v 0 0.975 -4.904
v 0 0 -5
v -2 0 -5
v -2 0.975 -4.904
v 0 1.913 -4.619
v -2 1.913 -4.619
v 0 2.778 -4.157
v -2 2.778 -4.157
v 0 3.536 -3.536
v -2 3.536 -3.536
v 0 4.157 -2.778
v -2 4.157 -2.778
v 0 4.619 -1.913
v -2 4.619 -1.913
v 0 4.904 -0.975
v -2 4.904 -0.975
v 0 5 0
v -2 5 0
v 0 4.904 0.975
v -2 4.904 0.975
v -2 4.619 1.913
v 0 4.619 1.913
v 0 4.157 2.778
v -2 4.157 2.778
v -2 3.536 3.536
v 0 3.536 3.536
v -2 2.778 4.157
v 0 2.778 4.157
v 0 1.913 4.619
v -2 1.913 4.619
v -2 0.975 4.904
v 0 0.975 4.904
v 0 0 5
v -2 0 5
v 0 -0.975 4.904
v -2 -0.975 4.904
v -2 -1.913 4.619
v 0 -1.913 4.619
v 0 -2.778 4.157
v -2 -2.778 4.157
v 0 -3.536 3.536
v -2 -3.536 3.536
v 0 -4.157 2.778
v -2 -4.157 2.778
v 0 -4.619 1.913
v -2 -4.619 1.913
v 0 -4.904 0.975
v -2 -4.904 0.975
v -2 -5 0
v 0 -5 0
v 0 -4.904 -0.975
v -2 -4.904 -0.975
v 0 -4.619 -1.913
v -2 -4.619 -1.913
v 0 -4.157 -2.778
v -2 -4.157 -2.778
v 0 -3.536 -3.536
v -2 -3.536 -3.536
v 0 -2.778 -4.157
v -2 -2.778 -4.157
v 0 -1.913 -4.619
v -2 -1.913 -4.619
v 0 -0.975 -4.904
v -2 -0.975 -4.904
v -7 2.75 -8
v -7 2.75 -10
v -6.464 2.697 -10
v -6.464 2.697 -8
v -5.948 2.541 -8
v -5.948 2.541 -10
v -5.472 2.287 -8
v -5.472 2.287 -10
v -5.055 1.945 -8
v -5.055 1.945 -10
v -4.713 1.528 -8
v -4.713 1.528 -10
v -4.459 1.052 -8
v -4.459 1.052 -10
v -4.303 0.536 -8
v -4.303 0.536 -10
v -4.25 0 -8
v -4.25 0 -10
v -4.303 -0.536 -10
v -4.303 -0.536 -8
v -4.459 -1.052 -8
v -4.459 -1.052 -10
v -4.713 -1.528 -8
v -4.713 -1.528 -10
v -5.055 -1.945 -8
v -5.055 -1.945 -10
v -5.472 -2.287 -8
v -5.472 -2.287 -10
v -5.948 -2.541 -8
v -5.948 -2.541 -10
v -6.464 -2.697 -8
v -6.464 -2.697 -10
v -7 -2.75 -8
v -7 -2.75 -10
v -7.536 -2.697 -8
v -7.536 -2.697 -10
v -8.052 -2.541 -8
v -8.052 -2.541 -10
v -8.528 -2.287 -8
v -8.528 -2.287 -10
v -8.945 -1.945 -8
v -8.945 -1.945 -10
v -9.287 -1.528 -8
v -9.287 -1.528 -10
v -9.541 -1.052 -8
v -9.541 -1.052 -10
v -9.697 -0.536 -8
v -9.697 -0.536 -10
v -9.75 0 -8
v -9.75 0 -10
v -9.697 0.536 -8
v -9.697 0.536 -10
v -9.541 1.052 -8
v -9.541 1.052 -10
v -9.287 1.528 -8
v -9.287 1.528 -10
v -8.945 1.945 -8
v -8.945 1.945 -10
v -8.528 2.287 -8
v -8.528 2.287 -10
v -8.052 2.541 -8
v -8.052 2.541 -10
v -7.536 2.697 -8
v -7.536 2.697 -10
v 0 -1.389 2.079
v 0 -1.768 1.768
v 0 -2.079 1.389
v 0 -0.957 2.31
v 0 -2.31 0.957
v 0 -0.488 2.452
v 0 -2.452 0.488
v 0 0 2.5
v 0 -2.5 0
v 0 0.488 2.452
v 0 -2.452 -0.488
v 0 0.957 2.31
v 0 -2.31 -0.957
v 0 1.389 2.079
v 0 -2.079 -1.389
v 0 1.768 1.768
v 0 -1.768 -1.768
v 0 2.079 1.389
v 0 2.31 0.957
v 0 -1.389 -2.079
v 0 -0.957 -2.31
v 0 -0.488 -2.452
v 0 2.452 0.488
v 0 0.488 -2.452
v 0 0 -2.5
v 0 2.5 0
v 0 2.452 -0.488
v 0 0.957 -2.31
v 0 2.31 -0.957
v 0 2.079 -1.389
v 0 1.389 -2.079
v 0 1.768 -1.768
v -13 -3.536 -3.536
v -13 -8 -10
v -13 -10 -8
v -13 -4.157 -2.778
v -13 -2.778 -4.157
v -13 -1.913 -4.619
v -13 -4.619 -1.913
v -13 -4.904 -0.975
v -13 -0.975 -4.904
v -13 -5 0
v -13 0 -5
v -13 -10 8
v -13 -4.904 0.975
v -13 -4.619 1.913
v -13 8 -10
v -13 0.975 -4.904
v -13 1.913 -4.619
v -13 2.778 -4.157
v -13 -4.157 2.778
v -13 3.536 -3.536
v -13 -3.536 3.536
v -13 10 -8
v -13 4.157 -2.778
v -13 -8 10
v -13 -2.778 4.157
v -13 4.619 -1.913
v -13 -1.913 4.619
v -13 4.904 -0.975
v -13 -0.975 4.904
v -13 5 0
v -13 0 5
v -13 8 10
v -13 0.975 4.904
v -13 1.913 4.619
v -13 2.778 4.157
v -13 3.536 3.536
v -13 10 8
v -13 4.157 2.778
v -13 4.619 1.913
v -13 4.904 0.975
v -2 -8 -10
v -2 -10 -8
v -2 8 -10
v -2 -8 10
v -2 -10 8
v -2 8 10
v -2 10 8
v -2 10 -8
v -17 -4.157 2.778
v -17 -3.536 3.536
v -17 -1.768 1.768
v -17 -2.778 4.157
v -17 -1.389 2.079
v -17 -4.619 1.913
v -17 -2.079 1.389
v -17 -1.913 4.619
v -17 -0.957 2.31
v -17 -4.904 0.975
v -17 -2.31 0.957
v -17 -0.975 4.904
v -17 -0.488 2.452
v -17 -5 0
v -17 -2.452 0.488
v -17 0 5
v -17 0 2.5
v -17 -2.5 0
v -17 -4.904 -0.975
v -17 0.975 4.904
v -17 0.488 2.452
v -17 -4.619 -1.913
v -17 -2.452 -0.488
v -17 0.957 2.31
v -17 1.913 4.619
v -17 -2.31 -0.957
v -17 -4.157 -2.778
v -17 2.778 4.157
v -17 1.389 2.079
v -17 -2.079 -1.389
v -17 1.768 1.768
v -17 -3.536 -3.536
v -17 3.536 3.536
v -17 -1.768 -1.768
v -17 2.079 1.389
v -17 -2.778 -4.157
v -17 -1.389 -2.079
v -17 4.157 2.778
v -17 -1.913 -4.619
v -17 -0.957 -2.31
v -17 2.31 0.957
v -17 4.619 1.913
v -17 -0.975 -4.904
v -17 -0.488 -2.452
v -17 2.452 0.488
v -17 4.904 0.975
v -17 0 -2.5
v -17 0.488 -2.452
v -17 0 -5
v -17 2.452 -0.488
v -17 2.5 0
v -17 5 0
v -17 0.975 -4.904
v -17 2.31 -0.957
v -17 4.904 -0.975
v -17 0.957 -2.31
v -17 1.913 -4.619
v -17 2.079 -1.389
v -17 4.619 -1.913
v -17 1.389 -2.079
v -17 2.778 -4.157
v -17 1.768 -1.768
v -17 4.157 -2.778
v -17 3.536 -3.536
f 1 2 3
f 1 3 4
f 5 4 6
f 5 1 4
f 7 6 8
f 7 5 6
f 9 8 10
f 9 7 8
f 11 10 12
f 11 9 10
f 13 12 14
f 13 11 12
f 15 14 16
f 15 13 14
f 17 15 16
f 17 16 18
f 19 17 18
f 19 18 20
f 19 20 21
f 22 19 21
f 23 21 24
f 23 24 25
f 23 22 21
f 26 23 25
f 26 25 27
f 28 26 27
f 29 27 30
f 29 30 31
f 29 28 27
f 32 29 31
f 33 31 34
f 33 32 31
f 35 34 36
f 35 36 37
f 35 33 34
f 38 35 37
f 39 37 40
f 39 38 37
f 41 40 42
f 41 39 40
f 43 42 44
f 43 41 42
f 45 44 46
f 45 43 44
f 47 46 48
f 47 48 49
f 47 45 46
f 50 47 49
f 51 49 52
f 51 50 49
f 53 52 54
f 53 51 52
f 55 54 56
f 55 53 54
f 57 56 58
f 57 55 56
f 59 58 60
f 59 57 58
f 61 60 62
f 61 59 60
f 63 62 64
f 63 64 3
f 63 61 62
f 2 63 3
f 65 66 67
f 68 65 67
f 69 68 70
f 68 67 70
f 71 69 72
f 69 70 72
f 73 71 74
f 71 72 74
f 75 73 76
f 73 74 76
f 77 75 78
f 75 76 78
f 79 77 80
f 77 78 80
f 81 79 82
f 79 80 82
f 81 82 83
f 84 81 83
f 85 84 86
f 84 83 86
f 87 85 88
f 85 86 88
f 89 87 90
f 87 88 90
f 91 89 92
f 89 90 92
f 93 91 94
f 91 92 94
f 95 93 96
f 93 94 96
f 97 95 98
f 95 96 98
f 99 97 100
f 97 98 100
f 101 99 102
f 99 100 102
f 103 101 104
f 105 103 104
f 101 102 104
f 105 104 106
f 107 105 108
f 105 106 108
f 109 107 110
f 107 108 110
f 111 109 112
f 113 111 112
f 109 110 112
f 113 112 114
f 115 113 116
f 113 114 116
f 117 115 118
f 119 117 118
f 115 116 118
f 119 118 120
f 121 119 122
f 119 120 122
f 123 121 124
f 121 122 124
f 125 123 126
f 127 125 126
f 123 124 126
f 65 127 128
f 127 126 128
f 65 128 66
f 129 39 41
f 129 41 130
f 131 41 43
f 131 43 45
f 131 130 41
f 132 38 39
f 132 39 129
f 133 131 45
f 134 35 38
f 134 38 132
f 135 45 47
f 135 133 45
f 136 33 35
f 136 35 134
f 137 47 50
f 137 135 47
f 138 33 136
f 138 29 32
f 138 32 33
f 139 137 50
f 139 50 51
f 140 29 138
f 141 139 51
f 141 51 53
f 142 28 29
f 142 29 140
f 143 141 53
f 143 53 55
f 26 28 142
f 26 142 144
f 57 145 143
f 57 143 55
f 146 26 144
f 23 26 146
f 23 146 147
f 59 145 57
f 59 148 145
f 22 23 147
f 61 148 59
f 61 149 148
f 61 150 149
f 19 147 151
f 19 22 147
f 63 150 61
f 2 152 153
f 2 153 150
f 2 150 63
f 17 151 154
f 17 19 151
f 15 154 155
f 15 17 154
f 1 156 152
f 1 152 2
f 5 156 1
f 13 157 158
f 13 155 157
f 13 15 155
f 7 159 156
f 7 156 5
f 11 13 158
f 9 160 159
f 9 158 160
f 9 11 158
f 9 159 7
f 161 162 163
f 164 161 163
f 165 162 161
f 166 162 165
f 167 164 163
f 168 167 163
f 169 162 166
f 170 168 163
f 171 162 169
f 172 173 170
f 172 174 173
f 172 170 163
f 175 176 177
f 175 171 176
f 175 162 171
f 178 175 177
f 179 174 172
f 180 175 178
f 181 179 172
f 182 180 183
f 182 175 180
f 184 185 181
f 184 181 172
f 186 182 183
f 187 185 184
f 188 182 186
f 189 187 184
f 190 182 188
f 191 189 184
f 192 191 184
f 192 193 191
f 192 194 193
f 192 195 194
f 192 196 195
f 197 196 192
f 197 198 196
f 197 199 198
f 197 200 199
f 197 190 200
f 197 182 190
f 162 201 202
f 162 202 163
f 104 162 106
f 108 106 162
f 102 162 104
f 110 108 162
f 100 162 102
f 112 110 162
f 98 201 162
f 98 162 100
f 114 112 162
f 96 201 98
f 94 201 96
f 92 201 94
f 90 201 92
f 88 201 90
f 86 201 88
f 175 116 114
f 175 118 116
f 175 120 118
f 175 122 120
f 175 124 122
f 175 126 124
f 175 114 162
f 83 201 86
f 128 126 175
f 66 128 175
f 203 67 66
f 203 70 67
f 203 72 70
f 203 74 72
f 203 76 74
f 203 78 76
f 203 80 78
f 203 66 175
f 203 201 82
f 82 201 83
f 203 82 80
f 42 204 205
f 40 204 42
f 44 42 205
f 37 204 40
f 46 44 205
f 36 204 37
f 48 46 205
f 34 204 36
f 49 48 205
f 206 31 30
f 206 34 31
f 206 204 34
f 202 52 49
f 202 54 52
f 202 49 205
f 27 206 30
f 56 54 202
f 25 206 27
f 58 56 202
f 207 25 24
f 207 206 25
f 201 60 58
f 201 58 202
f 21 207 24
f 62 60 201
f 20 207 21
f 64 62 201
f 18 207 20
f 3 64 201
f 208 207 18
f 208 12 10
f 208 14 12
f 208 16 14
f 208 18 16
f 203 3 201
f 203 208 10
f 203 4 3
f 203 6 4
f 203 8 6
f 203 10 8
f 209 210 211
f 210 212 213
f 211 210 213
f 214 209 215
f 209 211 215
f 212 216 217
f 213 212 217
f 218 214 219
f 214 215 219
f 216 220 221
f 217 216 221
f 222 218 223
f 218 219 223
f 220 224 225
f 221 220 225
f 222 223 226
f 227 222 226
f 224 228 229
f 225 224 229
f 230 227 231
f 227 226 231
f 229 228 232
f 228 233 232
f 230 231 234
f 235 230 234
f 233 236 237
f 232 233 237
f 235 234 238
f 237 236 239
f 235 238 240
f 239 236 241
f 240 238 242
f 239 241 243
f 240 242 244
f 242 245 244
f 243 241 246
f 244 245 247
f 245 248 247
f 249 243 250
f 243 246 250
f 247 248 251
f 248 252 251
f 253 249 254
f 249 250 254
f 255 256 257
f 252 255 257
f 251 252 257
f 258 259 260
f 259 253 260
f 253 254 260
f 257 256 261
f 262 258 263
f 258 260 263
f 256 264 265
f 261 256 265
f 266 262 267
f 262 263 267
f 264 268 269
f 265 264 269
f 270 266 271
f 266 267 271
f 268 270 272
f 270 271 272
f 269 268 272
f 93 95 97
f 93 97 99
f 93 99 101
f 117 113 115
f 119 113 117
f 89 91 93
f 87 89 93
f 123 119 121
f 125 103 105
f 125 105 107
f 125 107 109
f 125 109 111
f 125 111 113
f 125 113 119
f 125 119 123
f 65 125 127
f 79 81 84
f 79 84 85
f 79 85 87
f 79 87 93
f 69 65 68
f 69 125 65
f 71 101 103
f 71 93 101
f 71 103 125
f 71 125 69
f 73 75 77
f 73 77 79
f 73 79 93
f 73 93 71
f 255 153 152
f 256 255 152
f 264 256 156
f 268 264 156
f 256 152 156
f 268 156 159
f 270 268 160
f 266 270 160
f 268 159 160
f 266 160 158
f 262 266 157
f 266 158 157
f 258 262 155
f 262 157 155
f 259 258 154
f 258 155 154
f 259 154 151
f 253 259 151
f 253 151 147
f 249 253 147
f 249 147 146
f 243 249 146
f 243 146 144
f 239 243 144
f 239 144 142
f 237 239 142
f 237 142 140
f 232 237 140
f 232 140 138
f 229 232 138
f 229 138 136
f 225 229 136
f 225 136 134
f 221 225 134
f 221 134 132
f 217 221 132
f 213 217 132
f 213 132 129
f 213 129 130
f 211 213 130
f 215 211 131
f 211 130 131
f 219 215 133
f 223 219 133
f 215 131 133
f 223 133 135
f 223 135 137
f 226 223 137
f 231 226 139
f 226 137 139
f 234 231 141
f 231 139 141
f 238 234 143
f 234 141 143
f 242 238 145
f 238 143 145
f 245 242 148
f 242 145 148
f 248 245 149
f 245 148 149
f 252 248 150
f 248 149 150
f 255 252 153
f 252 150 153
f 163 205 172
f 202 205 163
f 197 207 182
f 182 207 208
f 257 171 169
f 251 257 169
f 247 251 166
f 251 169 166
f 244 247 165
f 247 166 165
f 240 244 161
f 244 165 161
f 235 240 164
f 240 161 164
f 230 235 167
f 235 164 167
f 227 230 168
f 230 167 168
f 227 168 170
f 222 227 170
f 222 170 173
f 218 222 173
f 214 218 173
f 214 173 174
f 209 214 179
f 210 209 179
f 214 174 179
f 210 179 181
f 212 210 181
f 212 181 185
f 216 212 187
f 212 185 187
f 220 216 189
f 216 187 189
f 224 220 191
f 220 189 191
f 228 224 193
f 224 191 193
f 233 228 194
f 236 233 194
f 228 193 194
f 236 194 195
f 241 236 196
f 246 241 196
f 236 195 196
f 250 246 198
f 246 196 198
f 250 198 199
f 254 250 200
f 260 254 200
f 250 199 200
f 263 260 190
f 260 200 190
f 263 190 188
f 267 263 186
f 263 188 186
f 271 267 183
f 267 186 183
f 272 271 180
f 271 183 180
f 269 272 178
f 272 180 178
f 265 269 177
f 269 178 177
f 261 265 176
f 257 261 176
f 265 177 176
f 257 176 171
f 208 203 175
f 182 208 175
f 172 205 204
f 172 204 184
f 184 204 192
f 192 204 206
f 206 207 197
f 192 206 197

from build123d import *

# Parameters (mm, degrees)
SKETCH1_W           = 20
SKETCH1_H           = 20
BOSS_EXTRUDE1_DEPTH = 17
SKETCH2_R           = 15.353568197
SKETCH2_R_2         = 5
CUT_EXTRUDE1_DEPTH  = 2
CUT_EXTRUDE2_START  = -4
SKETCH3_R           = 15.635411304
SKETCH3_R_2         = 5
CUT_EXTRUDE2_DEPTH  = 4
SKETCH4_R           = 2.5
CUT_EXTRUDE3_DEPTH  = 23.113344387
CHAMFER1_SIZE       = 2
SKETCH5_R           = 2.75
CUT_EXTRUDE4_DEPTH  = 2


with BuildPart() as part:
    # Sketch1 → Boss-Extrude1 (new body)
    with BuildSketch(Plane(origin=(0, 0, 0), x_dir=(0, 0, -1), z_dir=(1, 0, 0))):
        Rectangle(SKETCH1_W, SKETCH1_H)
    extrude(amount=-BOSS_EXTRUDE1_DEPTH)

    # Sketch2 → Cut-Extrude1 (cut)
    with BuildSketch(Plane(origin=(0, 0, 0), x_dir=(0, 0, -1), z_dir=(1, 0, 0))):
        Circle(SKETCH2_R)
        Circle(SKETCH2_R_2, mode=Mode.SUBTRACT)
    extrude(amount=-CUT_EXTRUDE1_DEPTH, mode=Mode.SUBTRACT)

    # Sketch3 → Cut-Extrude2 (cut)
    with BuildSketch(Plane.ZY.offset(17).offset(CUT_EXTRUDE2_START)):
        Circle(SKETCH3_R)
        with Locations(Location((0, 0, 0), (0, 0, 180))):
            Circle(SKETCH3_R_2, mode=Mode.SUBTRACT)
    extrude(amount=CUT_EXTRUDE2_DEPTH, mode=Mode.SUBTRACT)

    # Sketch4 → Cut-Extrude3 (cut, through all)
    with BuildSketch(Plane(origin=(0, 0, 0), x_dir=(0, 0, -1), z_dir=(1, 0, 0))):
        Circle(SKETCH4_R)
    extrude(amount=-CUT_EXTRUDE3_DEPTH, mode=Mode.SUBTRACT)

    # Chamfer1
    chamfer1_edges = [part.edges().sort_by_distance(p)[0] for p in [
        (-7.5, -10, -10),
        (-7.5, -10, 10),
        (-7.5, 10, -10),
        (-7.5, 10, 10),
    ]]
    chamfer(chamfer1_edges, length=CHAMFER1_SIZE)

    # Sketch5 → Cut-Extrude4 (cut)
    with BuildSketch(Plane(origin=(0, 0, -10), x_dir=(-1, 0, 0), z_dir=(0, 0, -1))):
        with Locations(Location((7, 0, 0), (0, 0, 90))):
            Circle(SKETCH5_R)
    extrude(amount=-CUT_EXTRUDE4_DEPTH, mode=Mode.SUBTRACT)


solid = part.part
